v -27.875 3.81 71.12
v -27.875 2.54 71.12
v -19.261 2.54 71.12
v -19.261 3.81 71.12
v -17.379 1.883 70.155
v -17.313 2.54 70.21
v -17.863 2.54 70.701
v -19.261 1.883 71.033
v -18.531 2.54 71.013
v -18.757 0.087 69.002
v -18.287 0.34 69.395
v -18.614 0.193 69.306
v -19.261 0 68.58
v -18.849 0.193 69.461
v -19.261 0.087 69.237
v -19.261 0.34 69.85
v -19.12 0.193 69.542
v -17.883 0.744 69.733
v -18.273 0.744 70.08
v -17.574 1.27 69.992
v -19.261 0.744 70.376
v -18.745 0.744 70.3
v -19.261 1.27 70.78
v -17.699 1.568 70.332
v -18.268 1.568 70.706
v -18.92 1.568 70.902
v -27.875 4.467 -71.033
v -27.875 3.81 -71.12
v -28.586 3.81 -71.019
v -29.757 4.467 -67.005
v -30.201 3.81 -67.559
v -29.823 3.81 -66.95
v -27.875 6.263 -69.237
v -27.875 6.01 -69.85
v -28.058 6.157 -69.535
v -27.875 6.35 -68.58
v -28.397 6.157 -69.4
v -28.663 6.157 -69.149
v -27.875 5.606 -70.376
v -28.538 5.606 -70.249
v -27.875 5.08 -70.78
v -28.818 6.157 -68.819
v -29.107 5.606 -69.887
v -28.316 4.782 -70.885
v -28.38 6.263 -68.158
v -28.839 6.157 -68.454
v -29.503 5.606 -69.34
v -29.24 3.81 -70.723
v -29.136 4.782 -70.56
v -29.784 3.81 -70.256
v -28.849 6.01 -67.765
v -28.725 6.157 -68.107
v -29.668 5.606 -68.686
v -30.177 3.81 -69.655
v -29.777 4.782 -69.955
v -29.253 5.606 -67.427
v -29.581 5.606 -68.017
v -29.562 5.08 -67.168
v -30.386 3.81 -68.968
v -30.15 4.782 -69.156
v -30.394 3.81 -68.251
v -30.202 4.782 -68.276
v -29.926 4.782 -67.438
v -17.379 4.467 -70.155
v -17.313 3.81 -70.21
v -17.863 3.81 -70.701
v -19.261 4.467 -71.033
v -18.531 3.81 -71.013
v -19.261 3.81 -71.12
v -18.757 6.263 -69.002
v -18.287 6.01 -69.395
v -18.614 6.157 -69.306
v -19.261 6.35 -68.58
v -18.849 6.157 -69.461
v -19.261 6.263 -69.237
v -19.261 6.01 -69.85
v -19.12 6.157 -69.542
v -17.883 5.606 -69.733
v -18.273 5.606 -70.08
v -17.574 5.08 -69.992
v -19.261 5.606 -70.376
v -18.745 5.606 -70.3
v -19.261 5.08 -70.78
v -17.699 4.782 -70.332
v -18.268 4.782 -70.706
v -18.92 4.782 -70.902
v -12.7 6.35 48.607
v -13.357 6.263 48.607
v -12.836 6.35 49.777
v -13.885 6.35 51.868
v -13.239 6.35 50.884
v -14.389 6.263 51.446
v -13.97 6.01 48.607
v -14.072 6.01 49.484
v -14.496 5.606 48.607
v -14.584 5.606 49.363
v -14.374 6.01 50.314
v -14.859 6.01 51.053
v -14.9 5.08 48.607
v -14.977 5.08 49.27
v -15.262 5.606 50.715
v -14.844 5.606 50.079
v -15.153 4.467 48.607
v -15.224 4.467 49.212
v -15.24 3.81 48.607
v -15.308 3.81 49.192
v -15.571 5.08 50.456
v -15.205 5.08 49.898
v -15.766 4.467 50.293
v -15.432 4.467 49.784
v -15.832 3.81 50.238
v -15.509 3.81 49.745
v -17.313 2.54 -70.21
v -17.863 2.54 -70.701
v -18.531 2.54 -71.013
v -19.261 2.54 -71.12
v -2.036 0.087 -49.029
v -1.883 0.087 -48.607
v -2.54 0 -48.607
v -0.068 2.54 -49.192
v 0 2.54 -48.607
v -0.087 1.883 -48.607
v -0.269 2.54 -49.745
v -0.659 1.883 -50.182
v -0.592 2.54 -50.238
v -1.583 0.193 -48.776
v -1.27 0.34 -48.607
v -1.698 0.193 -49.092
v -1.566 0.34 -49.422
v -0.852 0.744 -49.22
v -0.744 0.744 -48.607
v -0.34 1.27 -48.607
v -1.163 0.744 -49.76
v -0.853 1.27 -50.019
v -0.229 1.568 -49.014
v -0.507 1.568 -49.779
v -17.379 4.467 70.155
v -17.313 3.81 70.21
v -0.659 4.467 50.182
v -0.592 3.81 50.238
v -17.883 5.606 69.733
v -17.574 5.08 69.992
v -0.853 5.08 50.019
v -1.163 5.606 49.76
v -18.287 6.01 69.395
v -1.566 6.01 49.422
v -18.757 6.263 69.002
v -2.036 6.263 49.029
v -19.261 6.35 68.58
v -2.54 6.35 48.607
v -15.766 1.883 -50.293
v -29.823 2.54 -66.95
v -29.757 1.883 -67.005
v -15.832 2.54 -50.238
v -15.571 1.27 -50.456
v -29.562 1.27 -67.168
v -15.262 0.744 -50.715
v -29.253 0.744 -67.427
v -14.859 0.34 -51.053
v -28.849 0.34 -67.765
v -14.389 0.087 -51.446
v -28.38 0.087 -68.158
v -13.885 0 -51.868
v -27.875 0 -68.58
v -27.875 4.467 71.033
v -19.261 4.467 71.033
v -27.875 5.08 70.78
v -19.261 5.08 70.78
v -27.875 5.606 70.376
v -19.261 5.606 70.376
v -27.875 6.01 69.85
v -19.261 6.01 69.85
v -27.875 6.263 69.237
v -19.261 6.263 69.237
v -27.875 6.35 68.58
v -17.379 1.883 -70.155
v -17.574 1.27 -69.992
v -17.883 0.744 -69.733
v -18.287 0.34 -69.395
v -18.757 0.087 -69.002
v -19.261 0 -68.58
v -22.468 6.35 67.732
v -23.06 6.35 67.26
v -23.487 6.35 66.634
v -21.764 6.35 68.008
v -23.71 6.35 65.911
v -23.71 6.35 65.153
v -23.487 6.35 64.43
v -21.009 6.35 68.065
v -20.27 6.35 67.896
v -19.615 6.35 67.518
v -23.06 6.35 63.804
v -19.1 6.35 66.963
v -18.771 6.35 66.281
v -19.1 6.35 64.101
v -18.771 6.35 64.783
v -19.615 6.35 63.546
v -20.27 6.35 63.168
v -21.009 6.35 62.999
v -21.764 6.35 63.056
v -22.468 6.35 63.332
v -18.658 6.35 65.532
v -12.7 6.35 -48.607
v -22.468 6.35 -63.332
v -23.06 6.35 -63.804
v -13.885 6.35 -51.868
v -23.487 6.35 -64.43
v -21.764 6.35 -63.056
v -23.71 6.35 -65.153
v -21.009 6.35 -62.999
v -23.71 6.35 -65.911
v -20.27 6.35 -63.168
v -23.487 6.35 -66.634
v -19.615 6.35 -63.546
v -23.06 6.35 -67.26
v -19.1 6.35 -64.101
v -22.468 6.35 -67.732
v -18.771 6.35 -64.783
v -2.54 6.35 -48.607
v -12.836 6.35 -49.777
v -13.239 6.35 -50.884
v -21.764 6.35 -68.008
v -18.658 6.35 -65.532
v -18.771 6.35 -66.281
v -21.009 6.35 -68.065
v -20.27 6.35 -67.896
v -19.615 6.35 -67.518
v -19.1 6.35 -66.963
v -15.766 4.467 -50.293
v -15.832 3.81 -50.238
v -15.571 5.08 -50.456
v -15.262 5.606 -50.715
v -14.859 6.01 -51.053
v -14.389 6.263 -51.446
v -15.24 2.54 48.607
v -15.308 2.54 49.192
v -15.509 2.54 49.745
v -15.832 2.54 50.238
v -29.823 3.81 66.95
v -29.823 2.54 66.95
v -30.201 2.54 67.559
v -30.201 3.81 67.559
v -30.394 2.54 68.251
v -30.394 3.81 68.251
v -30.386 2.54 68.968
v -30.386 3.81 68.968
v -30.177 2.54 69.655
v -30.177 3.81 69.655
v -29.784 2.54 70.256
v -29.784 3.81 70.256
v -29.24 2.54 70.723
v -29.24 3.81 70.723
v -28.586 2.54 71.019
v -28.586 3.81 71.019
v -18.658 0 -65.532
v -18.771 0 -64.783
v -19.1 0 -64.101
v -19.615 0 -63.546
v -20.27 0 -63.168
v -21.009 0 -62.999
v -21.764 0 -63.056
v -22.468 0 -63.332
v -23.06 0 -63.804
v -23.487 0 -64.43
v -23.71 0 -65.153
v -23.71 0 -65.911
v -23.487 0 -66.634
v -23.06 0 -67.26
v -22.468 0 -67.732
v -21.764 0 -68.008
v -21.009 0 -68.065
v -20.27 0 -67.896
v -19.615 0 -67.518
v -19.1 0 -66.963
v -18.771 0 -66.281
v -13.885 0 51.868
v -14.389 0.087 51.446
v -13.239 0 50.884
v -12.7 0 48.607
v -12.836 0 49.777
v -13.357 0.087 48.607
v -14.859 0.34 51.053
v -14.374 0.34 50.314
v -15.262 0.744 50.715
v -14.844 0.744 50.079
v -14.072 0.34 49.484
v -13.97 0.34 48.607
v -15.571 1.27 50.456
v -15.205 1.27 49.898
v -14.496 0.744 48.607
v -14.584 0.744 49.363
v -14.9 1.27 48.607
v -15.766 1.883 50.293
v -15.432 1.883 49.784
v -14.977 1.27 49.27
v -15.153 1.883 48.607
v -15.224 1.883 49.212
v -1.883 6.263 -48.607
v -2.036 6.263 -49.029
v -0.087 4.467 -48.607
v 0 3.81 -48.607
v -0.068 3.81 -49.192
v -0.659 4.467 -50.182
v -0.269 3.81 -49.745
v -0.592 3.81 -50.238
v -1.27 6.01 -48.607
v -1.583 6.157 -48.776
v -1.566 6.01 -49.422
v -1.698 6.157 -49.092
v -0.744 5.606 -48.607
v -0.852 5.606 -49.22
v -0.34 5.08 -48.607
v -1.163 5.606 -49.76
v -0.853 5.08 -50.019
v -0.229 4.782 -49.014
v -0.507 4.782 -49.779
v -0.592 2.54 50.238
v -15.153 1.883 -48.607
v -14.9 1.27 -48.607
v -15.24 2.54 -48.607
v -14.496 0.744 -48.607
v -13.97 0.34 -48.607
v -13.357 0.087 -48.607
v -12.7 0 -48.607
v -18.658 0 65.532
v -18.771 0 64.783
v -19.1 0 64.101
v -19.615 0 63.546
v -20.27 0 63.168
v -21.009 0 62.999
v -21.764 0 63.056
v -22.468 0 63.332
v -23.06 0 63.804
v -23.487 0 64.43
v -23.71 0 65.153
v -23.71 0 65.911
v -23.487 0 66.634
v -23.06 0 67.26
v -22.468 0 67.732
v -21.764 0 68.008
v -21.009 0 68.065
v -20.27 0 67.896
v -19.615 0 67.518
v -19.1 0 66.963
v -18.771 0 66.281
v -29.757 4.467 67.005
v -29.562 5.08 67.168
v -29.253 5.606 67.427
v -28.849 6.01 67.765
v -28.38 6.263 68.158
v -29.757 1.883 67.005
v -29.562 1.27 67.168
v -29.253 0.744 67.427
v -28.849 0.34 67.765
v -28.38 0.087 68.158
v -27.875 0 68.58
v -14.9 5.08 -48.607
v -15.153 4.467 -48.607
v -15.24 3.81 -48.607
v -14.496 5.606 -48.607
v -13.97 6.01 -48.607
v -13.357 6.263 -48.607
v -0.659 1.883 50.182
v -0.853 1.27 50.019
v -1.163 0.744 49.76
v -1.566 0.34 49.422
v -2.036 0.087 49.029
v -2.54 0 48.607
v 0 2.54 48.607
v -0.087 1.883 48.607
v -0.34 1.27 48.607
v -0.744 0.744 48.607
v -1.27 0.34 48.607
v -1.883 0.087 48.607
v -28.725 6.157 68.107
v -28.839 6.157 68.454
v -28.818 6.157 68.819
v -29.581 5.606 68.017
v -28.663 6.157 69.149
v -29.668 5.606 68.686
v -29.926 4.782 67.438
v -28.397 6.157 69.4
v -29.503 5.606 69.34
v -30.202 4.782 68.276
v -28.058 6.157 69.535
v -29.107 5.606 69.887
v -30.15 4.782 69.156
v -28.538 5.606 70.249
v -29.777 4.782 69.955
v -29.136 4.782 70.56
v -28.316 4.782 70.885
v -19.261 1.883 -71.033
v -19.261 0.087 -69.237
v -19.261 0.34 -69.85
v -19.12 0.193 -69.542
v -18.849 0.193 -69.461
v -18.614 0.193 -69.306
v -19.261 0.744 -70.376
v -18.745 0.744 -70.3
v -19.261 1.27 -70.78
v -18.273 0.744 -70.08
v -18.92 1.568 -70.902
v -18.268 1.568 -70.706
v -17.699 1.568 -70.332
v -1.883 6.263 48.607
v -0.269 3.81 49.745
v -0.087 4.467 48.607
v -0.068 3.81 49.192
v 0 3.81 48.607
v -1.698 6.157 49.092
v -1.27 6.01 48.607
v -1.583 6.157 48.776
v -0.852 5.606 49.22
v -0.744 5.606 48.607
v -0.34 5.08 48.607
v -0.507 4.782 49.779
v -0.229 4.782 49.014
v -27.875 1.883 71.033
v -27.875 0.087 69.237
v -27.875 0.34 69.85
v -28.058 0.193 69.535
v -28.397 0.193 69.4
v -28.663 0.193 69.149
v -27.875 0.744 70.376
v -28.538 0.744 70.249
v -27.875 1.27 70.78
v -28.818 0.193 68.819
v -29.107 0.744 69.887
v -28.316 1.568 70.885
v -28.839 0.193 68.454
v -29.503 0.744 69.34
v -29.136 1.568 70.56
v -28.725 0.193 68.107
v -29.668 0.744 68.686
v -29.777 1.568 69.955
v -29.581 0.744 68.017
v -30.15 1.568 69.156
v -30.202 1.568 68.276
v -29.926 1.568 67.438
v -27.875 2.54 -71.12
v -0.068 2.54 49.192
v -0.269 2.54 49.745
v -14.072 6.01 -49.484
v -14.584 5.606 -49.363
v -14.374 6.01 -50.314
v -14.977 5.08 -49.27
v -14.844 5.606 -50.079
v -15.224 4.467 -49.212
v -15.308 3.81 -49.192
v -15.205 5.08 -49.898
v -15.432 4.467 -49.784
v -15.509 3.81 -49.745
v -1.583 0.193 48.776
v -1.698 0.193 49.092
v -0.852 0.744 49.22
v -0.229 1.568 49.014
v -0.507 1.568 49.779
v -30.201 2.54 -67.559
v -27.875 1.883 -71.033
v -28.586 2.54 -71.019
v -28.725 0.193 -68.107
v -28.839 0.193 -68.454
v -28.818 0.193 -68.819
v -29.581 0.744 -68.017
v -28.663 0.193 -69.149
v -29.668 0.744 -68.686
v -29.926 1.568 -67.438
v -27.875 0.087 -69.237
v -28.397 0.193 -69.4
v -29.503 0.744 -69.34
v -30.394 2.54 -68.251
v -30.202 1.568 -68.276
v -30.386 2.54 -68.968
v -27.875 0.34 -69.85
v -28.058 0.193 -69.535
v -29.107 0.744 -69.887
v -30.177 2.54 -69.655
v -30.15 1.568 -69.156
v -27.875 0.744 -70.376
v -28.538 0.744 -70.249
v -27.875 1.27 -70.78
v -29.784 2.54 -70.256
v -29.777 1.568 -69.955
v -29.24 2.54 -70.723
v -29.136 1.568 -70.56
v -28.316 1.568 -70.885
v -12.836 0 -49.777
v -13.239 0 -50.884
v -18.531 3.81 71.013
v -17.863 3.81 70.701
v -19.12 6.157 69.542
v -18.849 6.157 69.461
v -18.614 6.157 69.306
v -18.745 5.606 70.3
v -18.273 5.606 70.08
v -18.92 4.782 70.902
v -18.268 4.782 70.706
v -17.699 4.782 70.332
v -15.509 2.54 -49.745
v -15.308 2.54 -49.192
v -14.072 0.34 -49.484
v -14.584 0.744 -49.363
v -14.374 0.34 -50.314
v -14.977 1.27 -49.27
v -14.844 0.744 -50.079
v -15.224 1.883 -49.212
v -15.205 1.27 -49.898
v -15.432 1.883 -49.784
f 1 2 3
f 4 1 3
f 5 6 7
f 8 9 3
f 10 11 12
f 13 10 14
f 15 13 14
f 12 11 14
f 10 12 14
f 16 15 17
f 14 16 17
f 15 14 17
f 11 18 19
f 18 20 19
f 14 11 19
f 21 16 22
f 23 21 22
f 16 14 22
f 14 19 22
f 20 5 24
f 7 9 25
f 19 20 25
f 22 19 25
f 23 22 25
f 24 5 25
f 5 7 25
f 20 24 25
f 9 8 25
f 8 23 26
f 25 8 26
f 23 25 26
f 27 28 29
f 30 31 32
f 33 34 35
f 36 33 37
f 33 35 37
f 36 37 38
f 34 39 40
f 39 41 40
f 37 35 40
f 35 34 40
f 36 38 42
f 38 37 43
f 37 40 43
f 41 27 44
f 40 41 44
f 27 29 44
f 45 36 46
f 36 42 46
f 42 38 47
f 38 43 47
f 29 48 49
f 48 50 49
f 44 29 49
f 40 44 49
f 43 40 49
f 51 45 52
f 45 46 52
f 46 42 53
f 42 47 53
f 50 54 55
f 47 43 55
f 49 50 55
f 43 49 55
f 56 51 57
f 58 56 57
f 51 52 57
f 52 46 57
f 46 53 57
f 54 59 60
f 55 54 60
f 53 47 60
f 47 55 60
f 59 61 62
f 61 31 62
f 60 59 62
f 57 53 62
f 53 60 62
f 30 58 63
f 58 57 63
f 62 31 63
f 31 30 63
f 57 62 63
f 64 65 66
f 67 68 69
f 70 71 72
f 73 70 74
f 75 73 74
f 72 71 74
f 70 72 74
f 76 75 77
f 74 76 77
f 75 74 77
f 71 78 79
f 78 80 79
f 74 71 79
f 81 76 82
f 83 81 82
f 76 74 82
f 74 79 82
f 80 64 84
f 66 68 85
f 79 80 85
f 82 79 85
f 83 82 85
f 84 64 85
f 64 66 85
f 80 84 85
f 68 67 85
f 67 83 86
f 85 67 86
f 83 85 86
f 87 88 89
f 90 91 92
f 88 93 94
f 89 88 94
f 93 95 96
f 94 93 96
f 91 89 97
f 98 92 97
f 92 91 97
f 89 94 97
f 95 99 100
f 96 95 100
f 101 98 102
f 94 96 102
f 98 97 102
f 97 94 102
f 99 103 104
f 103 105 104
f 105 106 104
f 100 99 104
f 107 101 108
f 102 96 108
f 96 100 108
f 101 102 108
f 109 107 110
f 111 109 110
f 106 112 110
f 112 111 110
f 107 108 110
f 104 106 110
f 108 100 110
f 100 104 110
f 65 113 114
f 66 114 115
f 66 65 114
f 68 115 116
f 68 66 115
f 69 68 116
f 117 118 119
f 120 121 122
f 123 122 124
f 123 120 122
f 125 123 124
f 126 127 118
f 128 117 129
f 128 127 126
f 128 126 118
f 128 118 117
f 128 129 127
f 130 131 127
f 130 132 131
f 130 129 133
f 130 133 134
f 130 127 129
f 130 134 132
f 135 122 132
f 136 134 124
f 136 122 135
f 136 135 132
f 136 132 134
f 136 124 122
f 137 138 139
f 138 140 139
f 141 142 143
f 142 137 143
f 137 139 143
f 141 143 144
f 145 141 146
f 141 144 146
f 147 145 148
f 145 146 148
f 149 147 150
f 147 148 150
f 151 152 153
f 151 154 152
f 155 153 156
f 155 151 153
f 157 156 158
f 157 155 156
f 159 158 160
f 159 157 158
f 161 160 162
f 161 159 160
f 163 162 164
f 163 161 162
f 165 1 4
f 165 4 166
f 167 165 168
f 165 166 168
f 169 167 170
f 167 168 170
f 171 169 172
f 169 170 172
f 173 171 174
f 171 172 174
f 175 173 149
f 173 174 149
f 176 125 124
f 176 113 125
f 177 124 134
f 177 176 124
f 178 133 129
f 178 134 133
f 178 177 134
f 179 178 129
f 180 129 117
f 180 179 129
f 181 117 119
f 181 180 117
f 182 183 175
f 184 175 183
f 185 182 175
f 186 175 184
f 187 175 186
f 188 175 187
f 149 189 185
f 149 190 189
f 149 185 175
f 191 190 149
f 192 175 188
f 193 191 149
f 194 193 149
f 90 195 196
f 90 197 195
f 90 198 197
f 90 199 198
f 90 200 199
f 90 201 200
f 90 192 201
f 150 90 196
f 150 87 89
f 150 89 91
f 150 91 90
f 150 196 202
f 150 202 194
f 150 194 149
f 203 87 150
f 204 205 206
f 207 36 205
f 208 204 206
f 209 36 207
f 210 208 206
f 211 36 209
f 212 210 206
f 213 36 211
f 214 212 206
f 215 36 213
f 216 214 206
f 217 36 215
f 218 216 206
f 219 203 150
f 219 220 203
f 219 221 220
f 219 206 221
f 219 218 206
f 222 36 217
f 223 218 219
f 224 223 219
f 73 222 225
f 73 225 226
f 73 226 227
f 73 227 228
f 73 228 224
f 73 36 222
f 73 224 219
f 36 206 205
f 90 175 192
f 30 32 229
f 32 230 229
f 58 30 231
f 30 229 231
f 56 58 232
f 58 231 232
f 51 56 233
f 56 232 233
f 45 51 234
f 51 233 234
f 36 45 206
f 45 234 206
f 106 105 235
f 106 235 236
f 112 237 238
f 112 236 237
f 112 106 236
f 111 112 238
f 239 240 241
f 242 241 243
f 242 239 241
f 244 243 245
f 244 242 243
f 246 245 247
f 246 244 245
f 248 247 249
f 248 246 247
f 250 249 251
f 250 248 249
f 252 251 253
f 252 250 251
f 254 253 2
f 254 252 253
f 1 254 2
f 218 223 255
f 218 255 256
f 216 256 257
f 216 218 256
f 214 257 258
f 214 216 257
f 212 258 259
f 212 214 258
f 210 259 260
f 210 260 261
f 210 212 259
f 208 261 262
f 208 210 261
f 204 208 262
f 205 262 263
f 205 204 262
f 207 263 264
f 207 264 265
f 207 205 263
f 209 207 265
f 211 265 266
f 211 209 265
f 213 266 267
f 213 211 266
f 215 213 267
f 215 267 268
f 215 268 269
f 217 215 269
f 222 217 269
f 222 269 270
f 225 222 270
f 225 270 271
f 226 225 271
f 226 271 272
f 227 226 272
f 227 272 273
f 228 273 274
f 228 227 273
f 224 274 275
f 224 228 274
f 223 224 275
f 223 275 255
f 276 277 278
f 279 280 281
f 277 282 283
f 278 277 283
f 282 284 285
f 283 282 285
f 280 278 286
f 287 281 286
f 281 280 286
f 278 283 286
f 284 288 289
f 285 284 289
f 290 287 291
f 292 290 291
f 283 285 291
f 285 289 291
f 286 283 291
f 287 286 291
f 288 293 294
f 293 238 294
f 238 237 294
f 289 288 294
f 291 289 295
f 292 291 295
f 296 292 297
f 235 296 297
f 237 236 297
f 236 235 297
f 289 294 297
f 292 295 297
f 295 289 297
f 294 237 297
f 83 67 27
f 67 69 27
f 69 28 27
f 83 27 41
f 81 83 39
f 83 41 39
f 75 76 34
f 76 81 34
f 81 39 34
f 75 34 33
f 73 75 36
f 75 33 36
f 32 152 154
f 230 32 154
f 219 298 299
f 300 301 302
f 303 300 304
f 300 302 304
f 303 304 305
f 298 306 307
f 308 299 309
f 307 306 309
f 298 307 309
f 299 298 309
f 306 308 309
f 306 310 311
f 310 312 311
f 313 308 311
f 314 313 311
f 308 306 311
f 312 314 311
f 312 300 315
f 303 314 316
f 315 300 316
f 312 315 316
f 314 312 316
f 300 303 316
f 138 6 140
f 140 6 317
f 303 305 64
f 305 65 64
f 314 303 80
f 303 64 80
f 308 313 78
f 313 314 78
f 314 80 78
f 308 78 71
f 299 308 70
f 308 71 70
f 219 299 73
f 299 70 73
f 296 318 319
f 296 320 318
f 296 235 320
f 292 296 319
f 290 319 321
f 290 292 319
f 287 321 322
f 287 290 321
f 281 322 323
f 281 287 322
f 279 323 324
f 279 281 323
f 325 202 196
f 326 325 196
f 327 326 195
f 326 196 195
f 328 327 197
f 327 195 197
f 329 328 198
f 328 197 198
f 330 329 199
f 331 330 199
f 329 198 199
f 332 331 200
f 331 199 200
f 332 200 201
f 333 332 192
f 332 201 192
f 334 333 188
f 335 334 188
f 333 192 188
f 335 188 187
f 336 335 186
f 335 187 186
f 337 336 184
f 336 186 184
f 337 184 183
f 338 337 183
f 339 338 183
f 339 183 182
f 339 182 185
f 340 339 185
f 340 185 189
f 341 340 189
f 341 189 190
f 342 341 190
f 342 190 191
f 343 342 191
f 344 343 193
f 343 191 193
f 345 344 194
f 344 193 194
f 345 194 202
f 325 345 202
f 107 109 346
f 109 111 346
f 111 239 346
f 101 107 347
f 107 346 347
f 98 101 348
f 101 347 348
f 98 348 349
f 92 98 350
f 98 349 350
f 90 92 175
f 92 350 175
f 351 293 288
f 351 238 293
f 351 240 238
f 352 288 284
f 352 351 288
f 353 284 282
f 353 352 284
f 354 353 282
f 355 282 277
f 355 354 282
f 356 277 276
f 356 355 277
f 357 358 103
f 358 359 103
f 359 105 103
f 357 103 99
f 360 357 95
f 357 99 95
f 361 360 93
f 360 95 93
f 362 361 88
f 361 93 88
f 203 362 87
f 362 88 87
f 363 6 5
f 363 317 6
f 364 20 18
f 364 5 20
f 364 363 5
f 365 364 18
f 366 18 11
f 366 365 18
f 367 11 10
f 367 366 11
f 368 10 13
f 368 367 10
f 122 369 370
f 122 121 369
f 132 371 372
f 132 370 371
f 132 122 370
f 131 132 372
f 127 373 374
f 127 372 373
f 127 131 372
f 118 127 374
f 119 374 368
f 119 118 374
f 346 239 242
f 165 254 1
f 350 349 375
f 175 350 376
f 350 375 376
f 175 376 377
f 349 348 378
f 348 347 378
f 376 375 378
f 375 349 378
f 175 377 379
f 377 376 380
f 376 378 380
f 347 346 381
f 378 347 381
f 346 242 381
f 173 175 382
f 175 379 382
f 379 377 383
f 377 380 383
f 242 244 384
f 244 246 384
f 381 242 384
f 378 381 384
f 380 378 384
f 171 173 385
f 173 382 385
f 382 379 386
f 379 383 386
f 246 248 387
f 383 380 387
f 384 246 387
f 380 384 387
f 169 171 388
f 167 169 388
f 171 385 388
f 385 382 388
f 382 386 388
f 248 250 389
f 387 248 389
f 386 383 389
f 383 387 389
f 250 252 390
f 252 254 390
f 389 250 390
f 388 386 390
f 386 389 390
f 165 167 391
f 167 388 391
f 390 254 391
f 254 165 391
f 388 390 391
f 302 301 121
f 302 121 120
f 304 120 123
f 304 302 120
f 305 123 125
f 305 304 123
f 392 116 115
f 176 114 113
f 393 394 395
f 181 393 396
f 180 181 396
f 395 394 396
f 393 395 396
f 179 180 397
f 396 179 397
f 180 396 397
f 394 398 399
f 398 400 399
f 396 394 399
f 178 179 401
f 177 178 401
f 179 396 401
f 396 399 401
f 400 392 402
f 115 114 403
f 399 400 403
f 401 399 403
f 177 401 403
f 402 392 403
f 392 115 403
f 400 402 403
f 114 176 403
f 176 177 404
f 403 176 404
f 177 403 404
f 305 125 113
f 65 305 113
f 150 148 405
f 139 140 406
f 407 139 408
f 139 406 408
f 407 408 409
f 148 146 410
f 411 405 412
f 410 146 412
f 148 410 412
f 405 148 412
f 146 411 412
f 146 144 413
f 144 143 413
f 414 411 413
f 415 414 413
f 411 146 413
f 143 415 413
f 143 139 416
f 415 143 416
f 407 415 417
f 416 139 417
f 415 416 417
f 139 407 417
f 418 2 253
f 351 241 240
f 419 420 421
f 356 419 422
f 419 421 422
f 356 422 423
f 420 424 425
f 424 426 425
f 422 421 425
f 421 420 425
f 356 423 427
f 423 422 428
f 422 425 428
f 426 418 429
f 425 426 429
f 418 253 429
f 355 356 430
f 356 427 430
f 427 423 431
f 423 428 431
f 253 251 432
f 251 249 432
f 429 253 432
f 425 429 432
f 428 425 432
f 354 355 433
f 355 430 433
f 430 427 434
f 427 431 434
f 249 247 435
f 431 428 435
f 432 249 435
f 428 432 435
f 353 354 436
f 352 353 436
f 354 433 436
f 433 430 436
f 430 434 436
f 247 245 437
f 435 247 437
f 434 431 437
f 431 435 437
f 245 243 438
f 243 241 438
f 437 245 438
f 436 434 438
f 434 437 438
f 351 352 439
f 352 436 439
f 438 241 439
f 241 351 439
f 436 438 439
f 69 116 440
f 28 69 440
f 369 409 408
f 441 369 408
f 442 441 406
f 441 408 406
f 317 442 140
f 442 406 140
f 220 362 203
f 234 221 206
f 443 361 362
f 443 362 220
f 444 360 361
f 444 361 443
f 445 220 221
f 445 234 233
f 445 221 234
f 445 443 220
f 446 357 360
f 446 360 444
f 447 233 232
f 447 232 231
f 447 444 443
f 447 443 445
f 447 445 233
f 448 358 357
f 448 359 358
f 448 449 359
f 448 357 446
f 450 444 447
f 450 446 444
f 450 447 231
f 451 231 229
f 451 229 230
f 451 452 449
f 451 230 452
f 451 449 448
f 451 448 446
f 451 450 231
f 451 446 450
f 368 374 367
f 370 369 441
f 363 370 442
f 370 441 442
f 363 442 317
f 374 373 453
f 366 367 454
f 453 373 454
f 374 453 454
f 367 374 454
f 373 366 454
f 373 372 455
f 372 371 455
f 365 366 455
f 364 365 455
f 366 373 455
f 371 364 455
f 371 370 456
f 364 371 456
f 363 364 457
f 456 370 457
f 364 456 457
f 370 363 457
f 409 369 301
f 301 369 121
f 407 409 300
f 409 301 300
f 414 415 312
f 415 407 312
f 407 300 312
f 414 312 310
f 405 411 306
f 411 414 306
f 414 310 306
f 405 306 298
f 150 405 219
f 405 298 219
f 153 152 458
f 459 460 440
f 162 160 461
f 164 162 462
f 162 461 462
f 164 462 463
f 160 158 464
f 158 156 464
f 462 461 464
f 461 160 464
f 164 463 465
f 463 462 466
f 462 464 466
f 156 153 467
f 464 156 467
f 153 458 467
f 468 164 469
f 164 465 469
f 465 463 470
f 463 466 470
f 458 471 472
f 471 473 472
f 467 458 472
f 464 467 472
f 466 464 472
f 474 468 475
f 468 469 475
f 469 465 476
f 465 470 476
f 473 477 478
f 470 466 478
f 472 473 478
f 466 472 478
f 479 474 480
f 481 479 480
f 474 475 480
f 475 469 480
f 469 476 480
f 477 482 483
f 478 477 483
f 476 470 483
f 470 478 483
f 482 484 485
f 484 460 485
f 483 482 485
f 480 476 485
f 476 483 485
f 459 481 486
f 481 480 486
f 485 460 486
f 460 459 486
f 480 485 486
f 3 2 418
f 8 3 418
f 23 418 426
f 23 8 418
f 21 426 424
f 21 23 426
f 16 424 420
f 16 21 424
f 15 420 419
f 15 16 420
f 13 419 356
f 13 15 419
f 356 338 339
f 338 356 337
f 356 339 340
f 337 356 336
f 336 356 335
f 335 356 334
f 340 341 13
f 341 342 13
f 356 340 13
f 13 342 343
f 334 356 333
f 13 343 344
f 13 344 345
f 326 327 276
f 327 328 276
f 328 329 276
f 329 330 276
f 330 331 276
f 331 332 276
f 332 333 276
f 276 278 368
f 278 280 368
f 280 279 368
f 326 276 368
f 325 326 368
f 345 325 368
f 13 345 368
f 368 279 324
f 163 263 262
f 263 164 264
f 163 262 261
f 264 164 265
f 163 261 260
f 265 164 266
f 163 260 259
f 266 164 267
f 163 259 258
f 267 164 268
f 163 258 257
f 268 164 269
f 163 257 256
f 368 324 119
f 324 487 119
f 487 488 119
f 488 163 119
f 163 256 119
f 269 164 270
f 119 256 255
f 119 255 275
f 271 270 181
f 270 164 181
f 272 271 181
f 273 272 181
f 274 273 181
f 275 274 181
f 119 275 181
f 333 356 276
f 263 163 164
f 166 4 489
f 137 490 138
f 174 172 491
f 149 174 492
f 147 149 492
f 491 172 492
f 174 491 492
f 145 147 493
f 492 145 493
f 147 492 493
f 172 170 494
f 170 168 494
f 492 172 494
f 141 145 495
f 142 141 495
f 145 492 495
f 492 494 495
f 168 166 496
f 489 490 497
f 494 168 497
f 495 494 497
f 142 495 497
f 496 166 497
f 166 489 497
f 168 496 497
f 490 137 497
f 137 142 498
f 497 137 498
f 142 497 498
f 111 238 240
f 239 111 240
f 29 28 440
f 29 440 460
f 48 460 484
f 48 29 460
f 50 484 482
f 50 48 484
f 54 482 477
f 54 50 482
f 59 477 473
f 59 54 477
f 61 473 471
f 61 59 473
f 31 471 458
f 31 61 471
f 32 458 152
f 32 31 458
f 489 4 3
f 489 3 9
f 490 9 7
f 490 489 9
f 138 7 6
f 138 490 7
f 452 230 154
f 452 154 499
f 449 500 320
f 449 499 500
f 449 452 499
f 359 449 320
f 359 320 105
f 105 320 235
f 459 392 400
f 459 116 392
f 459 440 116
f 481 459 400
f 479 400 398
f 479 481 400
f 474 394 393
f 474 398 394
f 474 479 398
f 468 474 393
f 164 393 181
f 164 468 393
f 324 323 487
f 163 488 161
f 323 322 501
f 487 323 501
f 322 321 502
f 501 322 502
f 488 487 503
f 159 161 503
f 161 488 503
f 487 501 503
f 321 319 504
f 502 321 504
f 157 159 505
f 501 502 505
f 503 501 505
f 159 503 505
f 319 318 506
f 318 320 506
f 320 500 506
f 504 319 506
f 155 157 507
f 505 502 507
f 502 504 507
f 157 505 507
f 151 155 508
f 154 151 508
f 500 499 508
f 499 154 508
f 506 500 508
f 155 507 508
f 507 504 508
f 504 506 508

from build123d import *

# Parameters (mm, degrees)
BOSS_EXTRUDE1_DEPTH = 6.35
FILLET1_R           = 2.54
SKETCH2_R           = 2.54
CUT_EXTRUDE1_DEPTH  = 6.35


with BuildPart() as part:
    # Sketch1 → Boss-Extrude1 (new body)
    with BuildSketch(Plane(origin=(0, 0, 0), x_dir=(1, 0, 0), z_dir=(0, 1, 0))):
        Polygon((0, -49.53), (0, 49.53), (-18.074412074, 71.12), (-33.314412074, 71.12), (-15.24, 49.53), (-15.24, -49.53), (-33.314412074, -71.12), (-18.074412074, -71.12), align=None)
    extrude(amount=BOSS_EXTRUDE1_DEPTH)

    # Fillet1
    fillet1_edges = [part.edges().sort_by_distance(p)[0] for p in [
        (-15.24, 0, 0),
        (-24.277206037, 0, -60.325),
        (-25.694412074, 0, -71.12),
        (-9.037206037, 0, -60.325),
        (-24.277206037, 6.35, -60.325),
        (0, 3.175, -49.53),
        (0, 3.175, 49.53),
        (-18.074412074, 3.175, 71.12),
        (-33.314412074, 3.175, 71.12),
        (-15.24, 3.175, 49.53),
        (-15.24, 3.175, -49.53),
        (-33.314412074, 3.175, -71.12),
        (-18.074412074, 3.175, -71.12),
        (-15.24, 6.35, 0),
        (-24.277206037, 6.35, 60.325),
        (-25.694412074, 6.35, 71.12),
        (-9.037206037, 6.35, 60.325),
        (0, 6.35, 0),
        (-9.037206037, 6.35, -60.325),
        (0, 0, 0),
        (-25.694412074, 6.35, -71.12),
        (-9.037206037, 0, 60.325),
        (-25.694412074, 0, 71.12),
        (-24.277206037, 0, 60.325),
    ]]
    fillet(fillet1_edges, radius=FILLET1_R)

    # Sketch2 → Cut-Extrude1 (cut)
    with BuildSketch(Plane(origin=(0, 6.35, 0), x_dir=(1, 0, 0), z_dir=(0, 1, 0))):
        with Locations((-21.19842308, -65.532)):
            Circle(SKETCH2_R)
    cut_extrude1 = extrude(amount=-CUT_EXTRUDE1_DEPTH, mode=Mode.SUBTRACT)

    # Mirror1: Cut-Extrude1 across plane
    add(cut_extrude1.mirror(Plane.XY), mode=Mode.SUBTRACT)


solid = part.part
